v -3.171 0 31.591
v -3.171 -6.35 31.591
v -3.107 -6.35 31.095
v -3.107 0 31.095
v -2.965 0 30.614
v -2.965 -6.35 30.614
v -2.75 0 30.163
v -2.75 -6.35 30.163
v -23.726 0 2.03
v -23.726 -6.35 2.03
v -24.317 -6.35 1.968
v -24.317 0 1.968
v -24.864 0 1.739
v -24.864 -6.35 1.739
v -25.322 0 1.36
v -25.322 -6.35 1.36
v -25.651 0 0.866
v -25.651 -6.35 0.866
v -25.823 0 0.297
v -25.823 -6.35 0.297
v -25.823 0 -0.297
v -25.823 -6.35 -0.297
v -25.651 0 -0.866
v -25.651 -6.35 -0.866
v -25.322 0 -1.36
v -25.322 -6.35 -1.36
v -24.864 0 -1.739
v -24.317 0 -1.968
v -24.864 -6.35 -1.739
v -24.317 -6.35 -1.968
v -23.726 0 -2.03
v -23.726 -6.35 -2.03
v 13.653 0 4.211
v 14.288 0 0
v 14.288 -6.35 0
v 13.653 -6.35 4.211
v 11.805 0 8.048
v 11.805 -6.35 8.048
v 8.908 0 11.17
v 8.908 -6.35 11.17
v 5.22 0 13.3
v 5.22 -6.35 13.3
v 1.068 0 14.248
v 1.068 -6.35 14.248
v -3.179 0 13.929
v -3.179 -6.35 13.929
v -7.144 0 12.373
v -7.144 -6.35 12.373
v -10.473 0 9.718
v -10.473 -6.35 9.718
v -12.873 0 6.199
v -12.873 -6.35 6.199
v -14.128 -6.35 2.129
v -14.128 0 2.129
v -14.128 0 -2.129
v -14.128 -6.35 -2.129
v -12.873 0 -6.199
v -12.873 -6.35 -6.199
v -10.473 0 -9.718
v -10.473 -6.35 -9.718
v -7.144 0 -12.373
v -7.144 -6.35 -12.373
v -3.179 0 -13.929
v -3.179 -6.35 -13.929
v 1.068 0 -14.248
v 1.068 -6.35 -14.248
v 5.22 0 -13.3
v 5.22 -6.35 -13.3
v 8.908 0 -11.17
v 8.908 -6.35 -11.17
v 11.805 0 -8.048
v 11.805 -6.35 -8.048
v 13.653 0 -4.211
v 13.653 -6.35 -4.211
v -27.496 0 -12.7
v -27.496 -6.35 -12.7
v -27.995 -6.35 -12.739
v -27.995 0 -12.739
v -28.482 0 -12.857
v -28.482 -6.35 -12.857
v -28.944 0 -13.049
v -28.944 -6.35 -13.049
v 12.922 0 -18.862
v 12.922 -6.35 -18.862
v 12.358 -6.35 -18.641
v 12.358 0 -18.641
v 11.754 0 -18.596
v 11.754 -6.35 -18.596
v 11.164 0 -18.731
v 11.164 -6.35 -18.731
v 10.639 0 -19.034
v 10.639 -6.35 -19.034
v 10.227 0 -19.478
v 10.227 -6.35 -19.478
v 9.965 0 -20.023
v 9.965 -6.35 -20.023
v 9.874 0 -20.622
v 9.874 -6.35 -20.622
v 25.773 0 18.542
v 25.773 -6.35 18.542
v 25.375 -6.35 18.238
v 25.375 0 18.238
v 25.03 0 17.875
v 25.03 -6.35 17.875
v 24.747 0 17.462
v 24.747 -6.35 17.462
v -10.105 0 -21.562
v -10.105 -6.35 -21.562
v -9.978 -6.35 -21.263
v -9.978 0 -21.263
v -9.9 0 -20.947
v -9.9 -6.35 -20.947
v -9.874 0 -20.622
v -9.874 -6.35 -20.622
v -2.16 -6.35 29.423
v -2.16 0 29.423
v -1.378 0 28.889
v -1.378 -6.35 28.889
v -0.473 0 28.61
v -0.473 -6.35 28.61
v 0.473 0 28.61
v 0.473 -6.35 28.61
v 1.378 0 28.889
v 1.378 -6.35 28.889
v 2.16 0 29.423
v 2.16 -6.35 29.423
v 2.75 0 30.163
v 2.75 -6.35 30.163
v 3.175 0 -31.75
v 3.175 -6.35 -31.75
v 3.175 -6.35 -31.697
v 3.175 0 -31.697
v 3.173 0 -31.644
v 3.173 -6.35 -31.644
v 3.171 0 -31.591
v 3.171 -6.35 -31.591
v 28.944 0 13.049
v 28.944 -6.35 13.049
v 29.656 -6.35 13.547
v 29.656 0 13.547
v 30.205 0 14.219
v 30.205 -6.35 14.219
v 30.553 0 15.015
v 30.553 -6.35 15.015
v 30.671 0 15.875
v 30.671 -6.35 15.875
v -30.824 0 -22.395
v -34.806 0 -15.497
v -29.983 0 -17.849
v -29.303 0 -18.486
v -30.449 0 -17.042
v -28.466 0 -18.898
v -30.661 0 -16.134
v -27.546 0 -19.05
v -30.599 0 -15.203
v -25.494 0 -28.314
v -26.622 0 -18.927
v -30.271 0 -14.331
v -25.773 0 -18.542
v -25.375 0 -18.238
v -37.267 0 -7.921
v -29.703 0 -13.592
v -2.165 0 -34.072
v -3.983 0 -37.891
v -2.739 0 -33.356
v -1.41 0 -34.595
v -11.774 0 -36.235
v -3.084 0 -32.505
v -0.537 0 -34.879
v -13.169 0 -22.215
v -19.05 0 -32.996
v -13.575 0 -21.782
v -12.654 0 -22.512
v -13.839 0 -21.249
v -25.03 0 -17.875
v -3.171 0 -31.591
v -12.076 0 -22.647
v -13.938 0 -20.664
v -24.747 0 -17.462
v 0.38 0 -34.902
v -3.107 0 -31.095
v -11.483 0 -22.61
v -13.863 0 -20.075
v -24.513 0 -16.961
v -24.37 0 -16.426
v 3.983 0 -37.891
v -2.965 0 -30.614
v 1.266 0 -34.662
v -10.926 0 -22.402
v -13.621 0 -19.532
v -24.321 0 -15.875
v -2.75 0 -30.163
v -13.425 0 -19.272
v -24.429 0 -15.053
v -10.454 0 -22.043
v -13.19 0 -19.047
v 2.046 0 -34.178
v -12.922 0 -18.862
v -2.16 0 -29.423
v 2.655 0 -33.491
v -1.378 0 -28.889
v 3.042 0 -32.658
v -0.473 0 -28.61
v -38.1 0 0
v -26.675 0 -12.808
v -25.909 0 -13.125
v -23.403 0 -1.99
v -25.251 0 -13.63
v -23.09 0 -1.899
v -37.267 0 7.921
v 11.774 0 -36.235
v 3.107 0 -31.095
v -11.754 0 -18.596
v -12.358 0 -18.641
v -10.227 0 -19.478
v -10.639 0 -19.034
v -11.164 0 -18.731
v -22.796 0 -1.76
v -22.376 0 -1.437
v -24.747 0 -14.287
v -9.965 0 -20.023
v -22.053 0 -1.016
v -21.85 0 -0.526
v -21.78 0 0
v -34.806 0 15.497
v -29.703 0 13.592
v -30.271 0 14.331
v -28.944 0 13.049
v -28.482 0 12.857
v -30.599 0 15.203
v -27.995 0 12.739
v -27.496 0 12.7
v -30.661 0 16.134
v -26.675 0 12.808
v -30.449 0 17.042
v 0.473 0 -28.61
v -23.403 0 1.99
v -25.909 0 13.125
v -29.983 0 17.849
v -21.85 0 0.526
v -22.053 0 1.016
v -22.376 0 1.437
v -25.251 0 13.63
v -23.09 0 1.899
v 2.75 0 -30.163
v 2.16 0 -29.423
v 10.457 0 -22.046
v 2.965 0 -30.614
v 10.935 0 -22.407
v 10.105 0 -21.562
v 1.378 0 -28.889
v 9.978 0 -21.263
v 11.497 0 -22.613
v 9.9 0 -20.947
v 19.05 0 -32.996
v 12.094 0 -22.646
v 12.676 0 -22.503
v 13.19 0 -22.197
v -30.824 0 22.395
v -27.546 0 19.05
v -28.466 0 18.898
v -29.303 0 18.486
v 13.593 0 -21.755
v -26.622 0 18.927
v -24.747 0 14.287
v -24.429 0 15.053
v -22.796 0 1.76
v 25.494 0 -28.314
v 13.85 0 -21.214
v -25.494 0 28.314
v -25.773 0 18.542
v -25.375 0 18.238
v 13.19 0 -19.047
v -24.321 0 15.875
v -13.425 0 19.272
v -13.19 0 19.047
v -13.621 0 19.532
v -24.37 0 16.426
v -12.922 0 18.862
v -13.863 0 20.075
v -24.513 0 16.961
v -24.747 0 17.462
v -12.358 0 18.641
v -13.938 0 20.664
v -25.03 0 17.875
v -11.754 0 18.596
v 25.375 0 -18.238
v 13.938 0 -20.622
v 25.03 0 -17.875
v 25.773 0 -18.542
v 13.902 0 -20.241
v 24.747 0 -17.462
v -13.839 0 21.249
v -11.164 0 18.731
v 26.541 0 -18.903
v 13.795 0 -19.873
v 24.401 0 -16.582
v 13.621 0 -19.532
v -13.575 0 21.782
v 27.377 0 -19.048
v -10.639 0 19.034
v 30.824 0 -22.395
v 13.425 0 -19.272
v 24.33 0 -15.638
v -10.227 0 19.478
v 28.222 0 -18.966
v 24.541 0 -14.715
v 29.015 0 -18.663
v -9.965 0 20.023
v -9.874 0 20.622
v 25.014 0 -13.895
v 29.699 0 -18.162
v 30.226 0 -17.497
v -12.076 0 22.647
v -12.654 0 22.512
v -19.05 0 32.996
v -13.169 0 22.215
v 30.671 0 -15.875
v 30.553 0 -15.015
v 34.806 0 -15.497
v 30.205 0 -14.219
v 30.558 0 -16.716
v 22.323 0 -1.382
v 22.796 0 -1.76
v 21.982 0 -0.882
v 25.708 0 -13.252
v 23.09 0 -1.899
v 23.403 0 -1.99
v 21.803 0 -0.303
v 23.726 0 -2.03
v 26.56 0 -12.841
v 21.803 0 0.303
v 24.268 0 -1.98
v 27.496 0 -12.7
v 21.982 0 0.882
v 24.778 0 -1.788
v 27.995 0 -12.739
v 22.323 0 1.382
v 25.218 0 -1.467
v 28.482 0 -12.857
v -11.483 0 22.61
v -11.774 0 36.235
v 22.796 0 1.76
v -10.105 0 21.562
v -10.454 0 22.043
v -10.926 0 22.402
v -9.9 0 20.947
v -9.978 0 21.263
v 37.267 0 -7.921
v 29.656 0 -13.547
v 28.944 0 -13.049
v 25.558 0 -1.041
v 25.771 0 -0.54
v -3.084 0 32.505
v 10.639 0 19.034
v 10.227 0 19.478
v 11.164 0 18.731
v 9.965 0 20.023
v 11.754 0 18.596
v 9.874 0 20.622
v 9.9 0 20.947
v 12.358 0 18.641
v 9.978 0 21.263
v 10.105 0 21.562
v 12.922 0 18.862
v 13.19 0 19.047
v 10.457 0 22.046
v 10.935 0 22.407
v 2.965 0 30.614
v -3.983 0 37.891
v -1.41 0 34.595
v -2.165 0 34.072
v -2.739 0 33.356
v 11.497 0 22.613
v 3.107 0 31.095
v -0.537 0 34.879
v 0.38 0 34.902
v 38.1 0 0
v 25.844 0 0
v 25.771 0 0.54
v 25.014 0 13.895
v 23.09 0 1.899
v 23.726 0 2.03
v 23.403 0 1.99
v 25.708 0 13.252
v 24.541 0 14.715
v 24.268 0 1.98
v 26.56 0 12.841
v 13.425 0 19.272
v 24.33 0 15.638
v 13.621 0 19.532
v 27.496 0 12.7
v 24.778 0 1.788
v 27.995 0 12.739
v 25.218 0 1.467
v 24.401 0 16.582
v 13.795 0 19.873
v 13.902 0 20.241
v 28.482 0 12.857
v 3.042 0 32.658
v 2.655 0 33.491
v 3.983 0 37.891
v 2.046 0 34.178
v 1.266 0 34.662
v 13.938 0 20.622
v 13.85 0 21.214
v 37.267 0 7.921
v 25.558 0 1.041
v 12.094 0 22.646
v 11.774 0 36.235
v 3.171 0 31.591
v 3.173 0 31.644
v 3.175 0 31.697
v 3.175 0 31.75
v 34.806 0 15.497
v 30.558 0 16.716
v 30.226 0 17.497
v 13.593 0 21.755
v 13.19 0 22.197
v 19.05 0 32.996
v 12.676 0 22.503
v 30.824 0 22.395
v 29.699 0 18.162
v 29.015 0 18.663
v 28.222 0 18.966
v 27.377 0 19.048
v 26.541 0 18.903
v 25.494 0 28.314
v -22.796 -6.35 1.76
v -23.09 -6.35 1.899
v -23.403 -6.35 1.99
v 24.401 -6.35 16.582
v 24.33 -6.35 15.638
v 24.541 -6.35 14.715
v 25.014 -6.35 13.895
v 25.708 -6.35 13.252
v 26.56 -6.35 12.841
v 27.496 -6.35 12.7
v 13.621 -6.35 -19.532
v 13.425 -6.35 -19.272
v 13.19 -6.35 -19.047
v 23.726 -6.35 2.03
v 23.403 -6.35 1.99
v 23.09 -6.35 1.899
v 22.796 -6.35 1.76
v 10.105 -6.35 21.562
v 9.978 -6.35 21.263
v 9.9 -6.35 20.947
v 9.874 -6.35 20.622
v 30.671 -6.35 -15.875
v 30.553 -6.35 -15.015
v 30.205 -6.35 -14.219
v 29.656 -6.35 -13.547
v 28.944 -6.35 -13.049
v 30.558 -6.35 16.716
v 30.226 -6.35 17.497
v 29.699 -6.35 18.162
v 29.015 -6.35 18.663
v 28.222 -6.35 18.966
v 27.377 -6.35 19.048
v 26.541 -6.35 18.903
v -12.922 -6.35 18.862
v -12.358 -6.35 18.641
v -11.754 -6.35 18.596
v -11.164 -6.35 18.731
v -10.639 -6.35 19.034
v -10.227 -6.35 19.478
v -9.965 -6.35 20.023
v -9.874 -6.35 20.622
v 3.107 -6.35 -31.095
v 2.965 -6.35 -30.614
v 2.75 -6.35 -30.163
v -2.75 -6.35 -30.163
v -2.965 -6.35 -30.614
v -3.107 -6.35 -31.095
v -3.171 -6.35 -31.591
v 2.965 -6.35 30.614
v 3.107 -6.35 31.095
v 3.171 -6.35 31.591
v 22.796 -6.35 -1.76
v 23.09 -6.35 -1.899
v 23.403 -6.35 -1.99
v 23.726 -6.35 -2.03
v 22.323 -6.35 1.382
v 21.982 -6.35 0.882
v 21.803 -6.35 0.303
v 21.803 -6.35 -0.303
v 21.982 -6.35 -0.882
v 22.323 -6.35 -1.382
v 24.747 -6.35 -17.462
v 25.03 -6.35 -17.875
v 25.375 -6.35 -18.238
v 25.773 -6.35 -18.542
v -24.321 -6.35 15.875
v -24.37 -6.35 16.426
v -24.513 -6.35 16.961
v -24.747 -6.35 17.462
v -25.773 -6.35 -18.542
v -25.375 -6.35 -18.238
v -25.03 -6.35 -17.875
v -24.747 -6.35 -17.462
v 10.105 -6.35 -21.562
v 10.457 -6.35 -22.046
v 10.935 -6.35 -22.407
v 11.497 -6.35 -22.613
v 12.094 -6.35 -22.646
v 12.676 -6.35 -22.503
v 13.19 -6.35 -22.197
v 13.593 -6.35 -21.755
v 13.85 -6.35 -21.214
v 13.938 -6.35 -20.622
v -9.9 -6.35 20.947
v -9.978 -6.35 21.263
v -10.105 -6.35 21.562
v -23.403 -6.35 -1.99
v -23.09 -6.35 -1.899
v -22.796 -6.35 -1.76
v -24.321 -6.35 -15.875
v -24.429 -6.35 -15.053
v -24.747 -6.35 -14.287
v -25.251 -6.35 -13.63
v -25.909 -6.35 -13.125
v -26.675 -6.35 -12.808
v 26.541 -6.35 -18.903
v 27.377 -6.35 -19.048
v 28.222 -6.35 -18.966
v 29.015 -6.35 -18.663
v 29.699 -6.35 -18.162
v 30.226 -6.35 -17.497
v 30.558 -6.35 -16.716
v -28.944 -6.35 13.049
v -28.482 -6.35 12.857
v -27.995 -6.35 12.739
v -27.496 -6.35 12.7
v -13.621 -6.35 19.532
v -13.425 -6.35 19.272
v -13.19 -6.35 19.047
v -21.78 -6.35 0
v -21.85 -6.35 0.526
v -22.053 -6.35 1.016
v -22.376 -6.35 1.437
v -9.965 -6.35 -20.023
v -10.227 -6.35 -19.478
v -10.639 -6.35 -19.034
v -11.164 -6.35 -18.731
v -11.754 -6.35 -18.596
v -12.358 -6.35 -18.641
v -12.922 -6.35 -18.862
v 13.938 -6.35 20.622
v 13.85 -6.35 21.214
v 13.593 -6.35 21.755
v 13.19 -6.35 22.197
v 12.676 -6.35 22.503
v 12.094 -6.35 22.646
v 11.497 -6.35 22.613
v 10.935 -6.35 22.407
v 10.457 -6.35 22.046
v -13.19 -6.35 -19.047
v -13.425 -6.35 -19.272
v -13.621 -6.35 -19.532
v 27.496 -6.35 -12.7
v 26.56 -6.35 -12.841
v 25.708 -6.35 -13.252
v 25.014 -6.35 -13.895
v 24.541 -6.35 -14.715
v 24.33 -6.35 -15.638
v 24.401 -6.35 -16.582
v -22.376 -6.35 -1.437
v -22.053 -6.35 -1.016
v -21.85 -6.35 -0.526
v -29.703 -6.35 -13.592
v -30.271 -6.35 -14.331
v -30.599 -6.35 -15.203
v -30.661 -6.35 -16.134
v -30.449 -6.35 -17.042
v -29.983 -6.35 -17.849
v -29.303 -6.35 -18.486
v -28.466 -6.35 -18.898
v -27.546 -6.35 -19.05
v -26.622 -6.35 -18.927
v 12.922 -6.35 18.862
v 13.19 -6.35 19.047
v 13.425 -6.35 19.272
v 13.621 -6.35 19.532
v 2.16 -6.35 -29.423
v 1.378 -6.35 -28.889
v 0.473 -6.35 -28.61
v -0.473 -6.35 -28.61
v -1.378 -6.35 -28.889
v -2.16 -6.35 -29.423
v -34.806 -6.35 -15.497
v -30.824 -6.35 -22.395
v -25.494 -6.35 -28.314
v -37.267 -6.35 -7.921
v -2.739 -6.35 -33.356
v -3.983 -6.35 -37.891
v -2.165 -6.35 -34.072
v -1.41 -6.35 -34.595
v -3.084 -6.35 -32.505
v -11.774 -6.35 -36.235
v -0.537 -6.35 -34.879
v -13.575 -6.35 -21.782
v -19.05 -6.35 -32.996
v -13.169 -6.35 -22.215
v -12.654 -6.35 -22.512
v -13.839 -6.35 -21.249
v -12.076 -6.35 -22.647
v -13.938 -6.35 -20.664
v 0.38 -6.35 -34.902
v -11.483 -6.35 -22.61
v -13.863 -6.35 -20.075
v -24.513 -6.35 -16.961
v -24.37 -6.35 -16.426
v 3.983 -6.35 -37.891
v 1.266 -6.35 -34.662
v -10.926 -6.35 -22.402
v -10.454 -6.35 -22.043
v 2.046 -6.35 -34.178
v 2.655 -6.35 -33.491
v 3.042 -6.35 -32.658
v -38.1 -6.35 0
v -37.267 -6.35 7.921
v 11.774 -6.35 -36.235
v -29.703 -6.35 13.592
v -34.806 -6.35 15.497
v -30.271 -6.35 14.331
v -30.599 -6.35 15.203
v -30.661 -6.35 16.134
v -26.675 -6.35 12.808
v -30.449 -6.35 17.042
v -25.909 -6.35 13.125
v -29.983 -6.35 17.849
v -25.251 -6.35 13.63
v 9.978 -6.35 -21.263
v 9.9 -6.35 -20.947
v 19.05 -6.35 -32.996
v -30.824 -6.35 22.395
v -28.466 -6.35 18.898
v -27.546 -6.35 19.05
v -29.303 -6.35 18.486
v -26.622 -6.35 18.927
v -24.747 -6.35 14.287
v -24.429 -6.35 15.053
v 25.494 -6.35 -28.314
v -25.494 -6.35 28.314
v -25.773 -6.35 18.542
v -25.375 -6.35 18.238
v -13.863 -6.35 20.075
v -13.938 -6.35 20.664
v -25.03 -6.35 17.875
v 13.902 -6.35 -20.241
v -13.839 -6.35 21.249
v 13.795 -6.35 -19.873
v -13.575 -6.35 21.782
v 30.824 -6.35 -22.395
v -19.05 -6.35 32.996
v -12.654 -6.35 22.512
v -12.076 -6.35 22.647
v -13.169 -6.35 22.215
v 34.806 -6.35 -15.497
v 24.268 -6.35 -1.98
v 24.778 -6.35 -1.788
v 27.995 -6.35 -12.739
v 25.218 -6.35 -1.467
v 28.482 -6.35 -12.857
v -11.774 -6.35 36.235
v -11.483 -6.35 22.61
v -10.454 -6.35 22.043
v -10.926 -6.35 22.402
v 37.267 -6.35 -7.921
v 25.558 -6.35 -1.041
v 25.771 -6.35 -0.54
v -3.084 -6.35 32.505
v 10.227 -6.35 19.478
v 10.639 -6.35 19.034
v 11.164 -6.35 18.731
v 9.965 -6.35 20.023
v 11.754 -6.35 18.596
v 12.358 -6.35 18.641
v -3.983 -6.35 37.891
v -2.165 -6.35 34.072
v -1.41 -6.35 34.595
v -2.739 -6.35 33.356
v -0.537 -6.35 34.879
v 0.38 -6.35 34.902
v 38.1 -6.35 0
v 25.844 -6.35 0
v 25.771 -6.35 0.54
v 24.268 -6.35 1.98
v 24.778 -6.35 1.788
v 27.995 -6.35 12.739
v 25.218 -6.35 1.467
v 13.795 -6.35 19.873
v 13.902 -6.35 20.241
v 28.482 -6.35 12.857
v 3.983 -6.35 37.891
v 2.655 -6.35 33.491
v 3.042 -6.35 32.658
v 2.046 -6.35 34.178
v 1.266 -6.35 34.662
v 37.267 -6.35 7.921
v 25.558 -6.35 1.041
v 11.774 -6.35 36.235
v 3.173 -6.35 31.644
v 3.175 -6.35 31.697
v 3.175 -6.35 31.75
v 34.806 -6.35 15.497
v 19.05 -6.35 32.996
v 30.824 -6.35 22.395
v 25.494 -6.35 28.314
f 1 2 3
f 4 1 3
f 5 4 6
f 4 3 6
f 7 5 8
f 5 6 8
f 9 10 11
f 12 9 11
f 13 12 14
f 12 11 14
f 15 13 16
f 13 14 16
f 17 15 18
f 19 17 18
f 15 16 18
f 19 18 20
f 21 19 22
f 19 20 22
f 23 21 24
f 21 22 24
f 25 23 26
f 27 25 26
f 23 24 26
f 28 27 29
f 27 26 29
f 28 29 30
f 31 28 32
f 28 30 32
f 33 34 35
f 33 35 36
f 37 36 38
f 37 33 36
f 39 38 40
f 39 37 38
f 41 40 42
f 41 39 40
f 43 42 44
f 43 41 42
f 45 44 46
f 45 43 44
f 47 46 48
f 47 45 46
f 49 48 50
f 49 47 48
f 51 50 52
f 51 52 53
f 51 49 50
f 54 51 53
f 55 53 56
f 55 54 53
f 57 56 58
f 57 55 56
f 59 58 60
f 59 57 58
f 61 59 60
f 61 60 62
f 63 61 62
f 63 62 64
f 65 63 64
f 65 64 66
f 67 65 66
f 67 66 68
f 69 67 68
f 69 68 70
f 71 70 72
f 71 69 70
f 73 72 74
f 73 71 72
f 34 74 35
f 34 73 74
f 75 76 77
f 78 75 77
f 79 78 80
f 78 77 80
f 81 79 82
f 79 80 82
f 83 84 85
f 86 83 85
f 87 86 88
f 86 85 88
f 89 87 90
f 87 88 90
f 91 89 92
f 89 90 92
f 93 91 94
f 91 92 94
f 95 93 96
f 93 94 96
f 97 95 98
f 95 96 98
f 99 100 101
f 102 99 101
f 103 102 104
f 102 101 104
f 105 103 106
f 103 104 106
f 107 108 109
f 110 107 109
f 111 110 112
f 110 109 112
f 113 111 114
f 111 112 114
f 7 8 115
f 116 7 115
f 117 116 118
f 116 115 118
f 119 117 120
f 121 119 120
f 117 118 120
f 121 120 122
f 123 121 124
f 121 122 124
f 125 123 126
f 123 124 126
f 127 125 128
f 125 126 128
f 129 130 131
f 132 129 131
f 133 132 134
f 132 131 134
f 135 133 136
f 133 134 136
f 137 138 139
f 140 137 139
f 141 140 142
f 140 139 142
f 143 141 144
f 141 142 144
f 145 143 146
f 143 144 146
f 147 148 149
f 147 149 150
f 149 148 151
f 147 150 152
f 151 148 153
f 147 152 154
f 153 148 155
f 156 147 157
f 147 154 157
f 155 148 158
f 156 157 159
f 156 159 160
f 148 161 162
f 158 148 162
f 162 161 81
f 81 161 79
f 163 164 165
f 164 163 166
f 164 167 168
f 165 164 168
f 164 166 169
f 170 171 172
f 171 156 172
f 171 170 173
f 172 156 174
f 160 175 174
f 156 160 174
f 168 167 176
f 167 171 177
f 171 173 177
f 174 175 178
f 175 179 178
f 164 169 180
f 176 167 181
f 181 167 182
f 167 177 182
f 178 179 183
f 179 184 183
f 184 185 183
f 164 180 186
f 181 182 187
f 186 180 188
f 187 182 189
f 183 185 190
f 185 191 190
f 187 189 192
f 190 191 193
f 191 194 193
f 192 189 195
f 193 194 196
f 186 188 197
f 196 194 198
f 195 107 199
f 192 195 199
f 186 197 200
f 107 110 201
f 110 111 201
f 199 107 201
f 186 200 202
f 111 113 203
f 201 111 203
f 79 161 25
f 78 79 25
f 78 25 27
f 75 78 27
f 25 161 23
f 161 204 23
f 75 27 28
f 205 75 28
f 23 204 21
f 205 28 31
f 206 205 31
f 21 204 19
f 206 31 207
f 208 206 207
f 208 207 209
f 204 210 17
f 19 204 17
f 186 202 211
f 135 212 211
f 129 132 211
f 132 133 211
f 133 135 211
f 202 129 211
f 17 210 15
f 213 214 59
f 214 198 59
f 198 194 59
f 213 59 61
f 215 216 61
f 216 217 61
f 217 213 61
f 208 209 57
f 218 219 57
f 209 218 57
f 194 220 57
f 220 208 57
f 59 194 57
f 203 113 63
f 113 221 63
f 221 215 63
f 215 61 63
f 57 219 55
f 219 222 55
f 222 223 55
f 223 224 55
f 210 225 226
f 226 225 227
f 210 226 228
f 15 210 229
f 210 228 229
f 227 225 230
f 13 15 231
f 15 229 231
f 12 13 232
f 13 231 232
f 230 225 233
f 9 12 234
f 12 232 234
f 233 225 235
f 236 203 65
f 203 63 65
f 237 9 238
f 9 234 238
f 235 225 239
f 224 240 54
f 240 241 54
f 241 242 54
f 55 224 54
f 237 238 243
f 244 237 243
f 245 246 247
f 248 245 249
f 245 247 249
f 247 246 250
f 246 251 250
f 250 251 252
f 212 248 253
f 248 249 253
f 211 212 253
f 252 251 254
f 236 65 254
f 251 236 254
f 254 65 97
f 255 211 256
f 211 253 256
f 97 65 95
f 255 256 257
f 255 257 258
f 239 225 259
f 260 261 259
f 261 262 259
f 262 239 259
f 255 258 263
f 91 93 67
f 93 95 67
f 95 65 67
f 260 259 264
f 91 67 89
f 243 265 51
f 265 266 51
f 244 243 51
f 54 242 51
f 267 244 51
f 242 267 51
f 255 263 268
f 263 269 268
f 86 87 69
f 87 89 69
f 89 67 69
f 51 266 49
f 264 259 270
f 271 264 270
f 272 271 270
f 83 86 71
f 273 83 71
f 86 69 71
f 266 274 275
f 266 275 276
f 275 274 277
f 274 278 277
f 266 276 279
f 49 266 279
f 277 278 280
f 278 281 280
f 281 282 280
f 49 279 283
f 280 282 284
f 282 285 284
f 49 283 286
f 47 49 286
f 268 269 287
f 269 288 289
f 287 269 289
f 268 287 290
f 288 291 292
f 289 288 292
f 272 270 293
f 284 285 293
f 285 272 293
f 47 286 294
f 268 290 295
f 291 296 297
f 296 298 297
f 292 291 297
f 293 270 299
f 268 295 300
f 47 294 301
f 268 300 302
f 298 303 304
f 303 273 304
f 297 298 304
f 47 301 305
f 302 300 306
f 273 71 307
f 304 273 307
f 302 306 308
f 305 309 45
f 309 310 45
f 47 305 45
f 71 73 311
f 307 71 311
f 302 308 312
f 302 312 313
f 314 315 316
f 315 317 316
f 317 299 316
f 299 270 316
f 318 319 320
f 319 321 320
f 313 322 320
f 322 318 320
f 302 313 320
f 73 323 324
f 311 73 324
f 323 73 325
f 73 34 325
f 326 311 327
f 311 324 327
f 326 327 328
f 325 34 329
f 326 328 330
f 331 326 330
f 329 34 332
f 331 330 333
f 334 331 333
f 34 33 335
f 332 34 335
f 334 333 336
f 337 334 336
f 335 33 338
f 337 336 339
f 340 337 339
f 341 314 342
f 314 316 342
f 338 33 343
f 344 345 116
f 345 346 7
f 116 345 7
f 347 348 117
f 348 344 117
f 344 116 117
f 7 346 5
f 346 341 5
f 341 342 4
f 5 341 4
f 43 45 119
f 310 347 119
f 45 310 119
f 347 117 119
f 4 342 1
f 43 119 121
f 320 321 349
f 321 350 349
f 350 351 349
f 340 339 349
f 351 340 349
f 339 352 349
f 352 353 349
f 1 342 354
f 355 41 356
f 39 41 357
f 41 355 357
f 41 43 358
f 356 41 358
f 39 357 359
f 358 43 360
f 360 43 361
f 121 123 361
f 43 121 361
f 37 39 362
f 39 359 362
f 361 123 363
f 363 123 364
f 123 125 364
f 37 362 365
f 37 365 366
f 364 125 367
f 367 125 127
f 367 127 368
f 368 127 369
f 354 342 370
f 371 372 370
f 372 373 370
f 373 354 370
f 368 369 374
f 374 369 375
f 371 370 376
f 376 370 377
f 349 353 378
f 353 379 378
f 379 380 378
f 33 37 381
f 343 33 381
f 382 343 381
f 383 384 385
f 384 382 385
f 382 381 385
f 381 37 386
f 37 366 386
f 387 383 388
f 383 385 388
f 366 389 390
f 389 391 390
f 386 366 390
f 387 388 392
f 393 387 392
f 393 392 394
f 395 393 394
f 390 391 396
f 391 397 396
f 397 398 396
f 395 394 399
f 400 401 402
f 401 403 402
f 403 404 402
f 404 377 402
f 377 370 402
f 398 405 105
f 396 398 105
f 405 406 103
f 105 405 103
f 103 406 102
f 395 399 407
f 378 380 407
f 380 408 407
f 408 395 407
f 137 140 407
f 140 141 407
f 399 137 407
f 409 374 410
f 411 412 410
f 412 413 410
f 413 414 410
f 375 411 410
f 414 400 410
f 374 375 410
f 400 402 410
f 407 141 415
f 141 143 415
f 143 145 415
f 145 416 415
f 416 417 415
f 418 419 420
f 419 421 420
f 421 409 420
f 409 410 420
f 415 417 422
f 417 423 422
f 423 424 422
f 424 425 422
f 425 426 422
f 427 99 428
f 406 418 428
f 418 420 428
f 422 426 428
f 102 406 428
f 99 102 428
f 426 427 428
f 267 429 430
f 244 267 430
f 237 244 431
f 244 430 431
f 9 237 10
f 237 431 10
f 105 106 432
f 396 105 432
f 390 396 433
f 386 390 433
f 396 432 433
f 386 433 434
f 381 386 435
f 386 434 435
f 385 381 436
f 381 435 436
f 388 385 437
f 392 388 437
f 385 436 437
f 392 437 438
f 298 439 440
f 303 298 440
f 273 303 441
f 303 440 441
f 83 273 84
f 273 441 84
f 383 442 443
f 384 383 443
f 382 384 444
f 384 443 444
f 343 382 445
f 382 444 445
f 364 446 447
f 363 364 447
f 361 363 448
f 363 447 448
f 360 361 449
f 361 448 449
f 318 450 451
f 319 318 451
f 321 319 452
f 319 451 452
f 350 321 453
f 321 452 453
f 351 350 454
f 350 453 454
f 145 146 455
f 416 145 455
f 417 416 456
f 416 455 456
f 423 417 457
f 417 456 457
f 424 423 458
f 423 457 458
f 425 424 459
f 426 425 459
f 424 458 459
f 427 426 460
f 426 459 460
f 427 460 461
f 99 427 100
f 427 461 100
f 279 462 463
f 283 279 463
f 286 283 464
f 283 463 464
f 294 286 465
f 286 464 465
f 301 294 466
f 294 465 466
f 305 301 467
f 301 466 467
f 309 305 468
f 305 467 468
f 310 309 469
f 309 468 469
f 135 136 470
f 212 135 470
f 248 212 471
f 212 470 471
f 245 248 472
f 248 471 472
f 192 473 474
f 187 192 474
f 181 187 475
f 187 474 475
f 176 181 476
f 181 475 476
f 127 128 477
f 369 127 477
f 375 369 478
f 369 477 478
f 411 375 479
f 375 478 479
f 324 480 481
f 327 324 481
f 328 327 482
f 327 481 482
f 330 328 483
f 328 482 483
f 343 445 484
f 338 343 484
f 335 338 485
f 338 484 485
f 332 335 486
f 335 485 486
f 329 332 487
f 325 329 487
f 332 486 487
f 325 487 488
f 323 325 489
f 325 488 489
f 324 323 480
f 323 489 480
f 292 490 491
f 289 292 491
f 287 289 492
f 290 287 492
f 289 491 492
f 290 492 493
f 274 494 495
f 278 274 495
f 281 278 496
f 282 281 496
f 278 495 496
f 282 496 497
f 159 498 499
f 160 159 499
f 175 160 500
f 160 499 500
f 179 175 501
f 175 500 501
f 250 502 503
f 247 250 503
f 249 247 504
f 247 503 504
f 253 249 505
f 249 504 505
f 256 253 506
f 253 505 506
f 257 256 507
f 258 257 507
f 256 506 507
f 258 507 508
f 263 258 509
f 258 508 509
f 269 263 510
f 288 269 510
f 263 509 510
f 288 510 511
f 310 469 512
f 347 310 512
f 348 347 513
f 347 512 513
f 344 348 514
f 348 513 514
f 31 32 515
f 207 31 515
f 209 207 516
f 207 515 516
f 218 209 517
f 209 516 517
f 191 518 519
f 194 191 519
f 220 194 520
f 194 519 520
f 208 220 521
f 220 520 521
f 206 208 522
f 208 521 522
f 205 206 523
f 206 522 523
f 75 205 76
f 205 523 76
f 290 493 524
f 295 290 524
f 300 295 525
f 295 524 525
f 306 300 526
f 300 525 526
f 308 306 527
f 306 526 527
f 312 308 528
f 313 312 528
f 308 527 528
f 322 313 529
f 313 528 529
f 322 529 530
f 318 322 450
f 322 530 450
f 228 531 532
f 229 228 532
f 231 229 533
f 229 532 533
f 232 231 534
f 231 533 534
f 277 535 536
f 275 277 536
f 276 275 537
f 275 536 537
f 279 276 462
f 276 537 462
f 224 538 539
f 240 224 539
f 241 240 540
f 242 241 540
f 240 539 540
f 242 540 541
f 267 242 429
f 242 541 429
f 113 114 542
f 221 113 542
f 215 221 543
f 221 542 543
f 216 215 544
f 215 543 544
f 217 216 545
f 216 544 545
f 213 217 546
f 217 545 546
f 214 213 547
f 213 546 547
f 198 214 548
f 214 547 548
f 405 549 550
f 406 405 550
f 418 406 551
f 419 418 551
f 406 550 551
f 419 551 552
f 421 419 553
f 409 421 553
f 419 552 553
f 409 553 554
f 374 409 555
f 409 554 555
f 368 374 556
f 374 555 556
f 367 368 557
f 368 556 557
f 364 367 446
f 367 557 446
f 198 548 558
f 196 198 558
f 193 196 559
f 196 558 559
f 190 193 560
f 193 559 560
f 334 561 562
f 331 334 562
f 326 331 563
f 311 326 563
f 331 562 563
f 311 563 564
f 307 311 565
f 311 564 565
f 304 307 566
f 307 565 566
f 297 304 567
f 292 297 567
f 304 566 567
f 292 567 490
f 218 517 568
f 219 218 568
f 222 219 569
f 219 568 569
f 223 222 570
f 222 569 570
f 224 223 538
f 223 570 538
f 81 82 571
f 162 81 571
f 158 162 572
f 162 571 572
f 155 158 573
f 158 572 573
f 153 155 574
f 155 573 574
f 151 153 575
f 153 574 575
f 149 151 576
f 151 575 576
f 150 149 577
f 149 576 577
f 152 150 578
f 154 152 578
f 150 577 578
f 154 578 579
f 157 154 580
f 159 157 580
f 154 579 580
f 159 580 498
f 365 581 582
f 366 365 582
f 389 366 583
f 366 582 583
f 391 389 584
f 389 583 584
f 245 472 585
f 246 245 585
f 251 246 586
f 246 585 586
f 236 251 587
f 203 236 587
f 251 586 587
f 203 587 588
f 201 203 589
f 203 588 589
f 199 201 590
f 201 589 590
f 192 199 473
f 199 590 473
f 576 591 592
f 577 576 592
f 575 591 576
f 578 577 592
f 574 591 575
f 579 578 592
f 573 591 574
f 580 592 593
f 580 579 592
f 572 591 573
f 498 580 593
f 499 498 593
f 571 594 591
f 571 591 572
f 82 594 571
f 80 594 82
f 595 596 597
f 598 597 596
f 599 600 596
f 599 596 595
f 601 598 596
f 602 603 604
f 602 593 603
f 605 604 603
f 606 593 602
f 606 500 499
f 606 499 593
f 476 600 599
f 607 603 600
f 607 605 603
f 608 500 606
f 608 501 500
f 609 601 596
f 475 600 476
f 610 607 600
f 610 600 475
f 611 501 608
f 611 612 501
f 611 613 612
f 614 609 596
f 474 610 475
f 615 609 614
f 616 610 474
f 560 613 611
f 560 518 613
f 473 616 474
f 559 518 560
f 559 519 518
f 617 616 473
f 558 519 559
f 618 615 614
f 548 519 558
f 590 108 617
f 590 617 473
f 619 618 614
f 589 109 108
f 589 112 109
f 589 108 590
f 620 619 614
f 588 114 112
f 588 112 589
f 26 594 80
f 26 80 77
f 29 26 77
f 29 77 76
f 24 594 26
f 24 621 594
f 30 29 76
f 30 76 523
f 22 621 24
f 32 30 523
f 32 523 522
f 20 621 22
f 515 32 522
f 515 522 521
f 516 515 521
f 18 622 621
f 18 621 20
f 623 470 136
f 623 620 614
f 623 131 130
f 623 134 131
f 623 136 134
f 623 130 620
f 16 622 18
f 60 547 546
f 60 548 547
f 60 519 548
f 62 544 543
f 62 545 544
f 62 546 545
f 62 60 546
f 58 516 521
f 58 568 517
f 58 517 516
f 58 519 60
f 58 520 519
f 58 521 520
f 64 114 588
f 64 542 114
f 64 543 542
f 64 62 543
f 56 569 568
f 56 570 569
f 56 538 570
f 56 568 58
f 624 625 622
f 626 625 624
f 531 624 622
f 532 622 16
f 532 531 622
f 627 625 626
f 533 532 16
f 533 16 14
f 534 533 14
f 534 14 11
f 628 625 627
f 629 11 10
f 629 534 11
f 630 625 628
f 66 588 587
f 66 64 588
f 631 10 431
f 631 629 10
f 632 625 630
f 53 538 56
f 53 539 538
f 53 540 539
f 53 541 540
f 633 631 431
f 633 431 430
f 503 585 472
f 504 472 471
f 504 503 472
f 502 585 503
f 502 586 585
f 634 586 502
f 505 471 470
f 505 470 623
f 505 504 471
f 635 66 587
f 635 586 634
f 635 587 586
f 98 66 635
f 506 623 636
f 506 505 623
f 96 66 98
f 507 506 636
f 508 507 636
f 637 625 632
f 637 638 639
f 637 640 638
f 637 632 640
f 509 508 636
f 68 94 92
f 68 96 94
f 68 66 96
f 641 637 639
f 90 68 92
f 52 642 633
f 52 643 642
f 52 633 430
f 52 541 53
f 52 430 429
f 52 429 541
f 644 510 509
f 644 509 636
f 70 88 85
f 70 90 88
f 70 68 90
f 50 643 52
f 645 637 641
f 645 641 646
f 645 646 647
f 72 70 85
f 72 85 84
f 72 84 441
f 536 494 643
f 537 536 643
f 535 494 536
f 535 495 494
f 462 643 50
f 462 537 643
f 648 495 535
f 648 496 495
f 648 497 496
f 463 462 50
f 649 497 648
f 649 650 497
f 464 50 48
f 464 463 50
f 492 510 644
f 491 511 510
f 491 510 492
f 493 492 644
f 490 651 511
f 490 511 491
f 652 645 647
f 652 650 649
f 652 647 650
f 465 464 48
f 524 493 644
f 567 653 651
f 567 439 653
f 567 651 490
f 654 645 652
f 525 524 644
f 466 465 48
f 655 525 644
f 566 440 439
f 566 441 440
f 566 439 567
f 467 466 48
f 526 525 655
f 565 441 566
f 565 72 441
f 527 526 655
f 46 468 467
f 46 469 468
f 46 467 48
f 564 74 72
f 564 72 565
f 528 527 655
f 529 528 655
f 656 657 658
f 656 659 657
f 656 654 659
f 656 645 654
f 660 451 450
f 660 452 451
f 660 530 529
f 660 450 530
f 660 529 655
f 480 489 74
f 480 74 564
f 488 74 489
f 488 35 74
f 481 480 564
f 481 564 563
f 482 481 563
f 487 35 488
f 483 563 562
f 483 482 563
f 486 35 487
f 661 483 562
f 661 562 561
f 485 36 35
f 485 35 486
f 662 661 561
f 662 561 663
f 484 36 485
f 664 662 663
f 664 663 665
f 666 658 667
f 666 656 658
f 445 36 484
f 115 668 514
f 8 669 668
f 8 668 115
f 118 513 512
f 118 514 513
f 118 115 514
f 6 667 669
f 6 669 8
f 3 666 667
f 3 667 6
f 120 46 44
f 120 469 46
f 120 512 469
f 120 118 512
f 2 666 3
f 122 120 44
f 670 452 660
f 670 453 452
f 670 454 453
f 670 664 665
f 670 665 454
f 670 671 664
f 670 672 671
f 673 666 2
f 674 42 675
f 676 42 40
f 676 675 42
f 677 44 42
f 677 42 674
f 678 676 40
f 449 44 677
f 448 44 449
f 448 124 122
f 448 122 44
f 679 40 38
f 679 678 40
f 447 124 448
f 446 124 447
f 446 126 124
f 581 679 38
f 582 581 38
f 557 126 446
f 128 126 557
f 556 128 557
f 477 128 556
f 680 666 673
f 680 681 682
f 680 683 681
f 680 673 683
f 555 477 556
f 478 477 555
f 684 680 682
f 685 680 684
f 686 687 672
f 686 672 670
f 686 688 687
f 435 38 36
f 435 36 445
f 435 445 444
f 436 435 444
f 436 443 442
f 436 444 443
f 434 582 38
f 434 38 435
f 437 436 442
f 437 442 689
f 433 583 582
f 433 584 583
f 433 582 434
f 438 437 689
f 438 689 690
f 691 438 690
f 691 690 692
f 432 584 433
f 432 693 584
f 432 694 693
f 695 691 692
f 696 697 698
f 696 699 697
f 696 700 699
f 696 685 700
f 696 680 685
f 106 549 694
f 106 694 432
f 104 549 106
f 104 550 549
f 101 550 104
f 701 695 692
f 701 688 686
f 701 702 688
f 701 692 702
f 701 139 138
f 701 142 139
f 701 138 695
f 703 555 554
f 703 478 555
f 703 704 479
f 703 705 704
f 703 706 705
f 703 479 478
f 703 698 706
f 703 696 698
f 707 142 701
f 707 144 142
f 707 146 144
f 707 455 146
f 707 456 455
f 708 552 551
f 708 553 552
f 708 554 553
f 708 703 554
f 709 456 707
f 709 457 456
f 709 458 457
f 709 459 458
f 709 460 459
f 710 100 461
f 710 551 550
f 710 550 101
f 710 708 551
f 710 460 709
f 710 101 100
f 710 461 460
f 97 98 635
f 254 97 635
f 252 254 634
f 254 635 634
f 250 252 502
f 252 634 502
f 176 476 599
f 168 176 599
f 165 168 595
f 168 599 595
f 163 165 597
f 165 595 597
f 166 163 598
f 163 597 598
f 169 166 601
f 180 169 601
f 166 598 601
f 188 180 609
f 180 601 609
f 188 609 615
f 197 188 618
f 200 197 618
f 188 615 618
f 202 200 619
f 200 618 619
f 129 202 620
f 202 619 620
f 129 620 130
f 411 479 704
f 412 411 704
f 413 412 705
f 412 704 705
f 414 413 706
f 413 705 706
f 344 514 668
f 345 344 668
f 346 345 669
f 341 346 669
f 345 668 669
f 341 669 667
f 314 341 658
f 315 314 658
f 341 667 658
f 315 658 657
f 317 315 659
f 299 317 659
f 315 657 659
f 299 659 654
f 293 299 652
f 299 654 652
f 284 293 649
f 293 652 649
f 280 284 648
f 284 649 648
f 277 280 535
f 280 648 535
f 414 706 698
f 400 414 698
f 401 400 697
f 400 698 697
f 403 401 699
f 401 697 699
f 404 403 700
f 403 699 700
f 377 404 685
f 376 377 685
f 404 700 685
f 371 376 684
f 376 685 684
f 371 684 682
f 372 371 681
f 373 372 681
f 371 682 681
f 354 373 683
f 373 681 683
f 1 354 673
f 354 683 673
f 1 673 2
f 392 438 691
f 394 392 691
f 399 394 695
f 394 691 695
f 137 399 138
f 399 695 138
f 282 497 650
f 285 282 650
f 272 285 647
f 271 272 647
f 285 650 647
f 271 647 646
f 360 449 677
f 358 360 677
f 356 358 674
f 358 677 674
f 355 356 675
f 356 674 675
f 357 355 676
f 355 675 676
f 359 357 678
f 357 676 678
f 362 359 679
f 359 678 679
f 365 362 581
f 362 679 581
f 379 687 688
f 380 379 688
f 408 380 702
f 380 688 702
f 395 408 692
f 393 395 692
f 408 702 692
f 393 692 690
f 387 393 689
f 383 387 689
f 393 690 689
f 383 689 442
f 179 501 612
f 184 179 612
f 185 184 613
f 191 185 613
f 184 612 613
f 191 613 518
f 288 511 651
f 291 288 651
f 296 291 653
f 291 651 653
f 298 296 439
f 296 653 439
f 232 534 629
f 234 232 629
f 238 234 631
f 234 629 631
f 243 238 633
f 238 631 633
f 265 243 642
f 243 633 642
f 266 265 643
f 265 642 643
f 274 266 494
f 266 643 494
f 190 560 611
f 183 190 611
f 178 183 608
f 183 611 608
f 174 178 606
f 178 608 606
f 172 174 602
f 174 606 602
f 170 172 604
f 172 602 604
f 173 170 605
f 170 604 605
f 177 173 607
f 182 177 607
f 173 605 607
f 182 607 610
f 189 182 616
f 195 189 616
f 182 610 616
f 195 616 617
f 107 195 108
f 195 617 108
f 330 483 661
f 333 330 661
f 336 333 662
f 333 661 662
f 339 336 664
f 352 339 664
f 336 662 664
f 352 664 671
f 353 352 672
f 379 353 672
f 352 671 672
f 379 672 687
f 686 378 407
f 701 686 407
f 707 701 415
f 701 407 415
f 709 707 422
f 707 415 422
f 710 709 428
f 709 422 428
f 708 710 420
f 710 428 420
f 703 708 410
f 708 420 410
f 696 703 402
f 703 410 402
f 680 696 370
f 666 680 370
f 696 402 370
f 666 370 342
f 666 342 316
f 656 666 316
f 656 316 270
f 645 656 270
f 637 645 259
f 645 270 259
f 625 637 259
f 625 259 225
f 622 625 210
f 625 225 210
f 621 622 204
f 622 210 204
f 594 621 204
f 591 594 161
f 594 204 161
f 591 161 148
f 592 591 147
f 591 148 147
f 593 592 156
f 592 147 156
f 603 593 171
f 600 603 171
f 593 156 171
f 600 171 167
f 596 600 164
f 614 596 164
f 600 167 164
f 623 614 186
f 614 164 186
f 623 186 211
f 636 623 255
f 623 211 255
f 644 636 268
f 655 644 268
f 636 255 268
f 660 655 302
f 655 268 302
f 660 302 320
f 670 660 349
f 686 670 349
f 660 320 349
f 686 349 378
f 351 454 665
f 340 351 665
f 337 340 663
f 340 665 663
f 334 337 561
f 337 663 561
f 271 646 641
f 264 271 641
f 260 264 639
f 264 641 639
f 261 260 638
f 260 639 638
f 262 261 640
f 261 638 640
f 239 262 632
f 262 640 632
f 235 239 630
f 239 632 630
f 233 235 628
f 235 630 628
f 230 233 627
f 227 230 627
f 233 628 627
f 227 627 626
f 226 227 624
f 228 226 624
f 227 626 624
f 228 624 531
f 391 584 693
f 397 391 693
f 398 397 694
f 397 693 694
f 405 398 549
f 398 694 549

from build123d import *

# Parameters (mm, degrees)
F0_R     = 38.1
F0_R_2   = 14.2875
F1_DEPTH = 6.35
F3_DEPTH = 6.351


with BuildPart() as f1:
    # F0 (on Front) → F1 (new body)
    with BuildSketch(Plane.XZ):
        Circle(F0_R)
        Circle(F0_R_2, mode=Mode.SUBTRACT)
    extrude(amount=F1_DEPTH)

    # F2 (on face) → F3 (cut, through all)
    with BuildSketch(Plane.XZ.offset(6.35)):
        with BuildLine():
            ThreePointArc((27.4963065702, 15.875), (28.2556646786, 14.4803285036), (28.9443394205, 13.0494335321))
            ThreePointArc((28.9443394205, 13.0494335321), (30.2053773795, 14.2192342104), (30.6713065702, 15.875))
            ThreePointArc((30.6713065702, 15.875), (29.0145478169, 18.6634706412), (25.7733106541, 18.5418164679))
            ThreePointArc((25.7733106541, 18.5418164679), (26.6681646786, 17.2299591606), (27.4963065702, 15.875))
        make_face()
        with BuildLine():
            ThreePointArc((27.4963065702, 12.7), (28.2411056923, 12.7885944421), (28.9443394205, 13.0494335321))
            ThreePointArc((28.9443394205, 13.0494335321), (28.2556646786, 14.4803285036), (27.4963065702, 15.875))
            Line((27.4963065702, 15.875), (27.4963065702, 12.7))
        make_face()
        with BuildLine():
            Line((24.7466759131, 17.4625), (27.4963065702, 15.875))
            ThreePointArc((27.4963065702, 15.875), (26.6681646786, 17.2299591606), (25.7733106541, 18.5418164679))
            ThreePointArc((25.7733106541, 18.5418164679), (25.1958005117, 18.0632177394), (24.7466759131, 17.4625))
        make_face()
        with BuildLine():
            ThreePointArc((0, 31.75), (1.5875, 31.7102876643), (3.1710287664, 31.59125))
            ThreePointArc((3.1710287664, 31.59125), (3.1740070363, 31.6706001681), (3.175, 31.75))
            ThreePointArc((3.175, 31.75), (-0.0793998319, 34.9240070363), (-3.1710287664, 31.59125))
            ThreePointArc((-3.1710287664, 31.59125), (-1.5875, 31.7102876643), (0, 31.75))
        make_face()
        with BuildLine():
            ThreePointArc((2.749630657, 30.1625), (3.0453051806, 30.8518121815), (3.1710287664, 31.59125))
            ThreePointArc((3.1710287664, 31.59125), (1.5875, 31.7102876643), (0, 31.75))
            Line((0, 31.75), (2.749630657, 30.1625))
        make_face()
        with BuildLine():
            Line((-2.749630657, 30.1625), (0, 31.75))
            ThreePointArc((0, 31.75), (-1.5875, 31.7102876643), (-3.1710287664, 31.59125))
            ThreePointArc((-3.1710287664, 31.59125), (-3.0453051806, 30.8518121815), (-2.749630657, 30.1625))
        make_face()
        with BuildLine():
            ThreePointArc((-27.4963065702, 15.875), (-26.6681646786, 17.2299591606), (-25.7733106541, 18.5418164679))
            ThreePointArc((-25.7733106541, 18.5418164679), (-30.2459372272, 17.4625), (-28.9443394205, 13.0494335321))
            ThreePointArc((-28.9443394205, 13.0494335321), (-28.2556646786, 14.4803285036), (-27.4963065702, 15.875))
        make_face()
        with BuildLine():
            Line((-27.4963065702, 15.875), (-24.7466759131, 17.4625))
            ThreePointArc((-24.7466759131, 17.4625), (-25.1958005117, 18.0632177394), (-25.7733106541, 18.5418164679))
            ThreePointArc((-25.7733106541, 18.5418164679), (-26.6681646786, 17.2299591606), (-27.4963065702, 15.875))
        make_face()
        with BuildLine():
            Line((-27.4963065702, 12.7), (-27.4963065702, 15.875))
            ThreePointArc((-27.4963065702, 15.875), (-28.2556646786, 14.4803285036), (-28.9443394205, 13.0494335321))
            ThreePointArc((-28.9443394205, 13.0494335321), (-28.2411056923, 12.7885944421), (-27.4963065702, 12.7))
        make_face()
        with BuildLine():
            ThreePointArc((-28.9443394205, -13.0494335321), (-30.2459372272, -17.4625), (-25.7733106541, -18.5418164679))
            ThreePointArc((-25.7733106541, -18.5418164679), (-26.6681646786, -17.2299591606), (-27.4963065702, -15.875))
            ThreePointArc((-27.4963065702, -15.875), (-28.2556646786, -14.4803285036), (-28.9443394205, -13.0494335321))
        make_face()
        with BuildLine():
            ThreePointArc((-28.9443394205, -13.0494335321), (-28.2556646786, -14.4803285036), (-27.4963065702, -15.875))
            Line((-27.4963065702, -15.875), (-27.4963065702, -12.7))
            ThreePointArc((-27.4963065702, -12.7), (-28.2411056923, -12.7885944421), (-28.9443394205, -13.0494335321))
        make_face()
        with BuildLine():
            ThreePointArc((-25.7733106541, -18.5418164679), (-25.1958005117, -18.0632177394), (-24.7466759131, -17.4625))
            Line((-24.7466759131, -17.4625), (-27.4963065702, -15.875))
            ThreePointArc((-27.4963065702, -15.875), (-26.6681646786, -17.2299591606), (-25.7733106541, -18.5418164679))
        make_face()
        with BuildLine():
            ThreePointArc((3.175, -31.75), (3.1740070363, -31.6706001681), (3.1710287664, -31.59125))
            ThreePointArc((3.1710287664, -31.59125), (1.5875, -31.7102876643), (0, -31.75))
            ThreePointArc((0, -31.75), (-1.5875, -31.7102876643), (-3.1710287664, -31.59125))
            ThreePointArc((-3.1710287664, -31.59125), (-0.0793998319, -34.9240070363), (3.175, -31.75))
        make_face()
        with BuildLine():
            ThreePointArc((-3.1710287664, -31.59125), (-1.5875, -31.7102876643), (0, -31.75))
            Line((0, -31.75), (-2.749630657, -30.1625))
            ThreePointArc((-2.749630657, -30.1625), (-3.0453051806, -30.8518121815), (-3.1710287664, -31.59125))
        make_face()
        with BuildLine():
            ThreePointArc((0, -31.75), (1.5875, -31.7102876643), (3.1710287664, -31.59125))
            ThreePointArc((3.1710287664, -31.59125), (3.0453051806, -30.8518121815), (2.749630657, -30.1625))
            Line((2.749630657, -30.1625), (0, -31.75))
        make_face()
        with BuildLine():
            ThreePointArc((30.6713065702, -15.875), (30.2053773795, -14.2192342104), (28.9443394205, -13.0494335321))
            ThreePointArc((28.9443394205, -13.0494335321), (28.2556646786, -14.4803285036), (27.4963065702, -15.875))
            ThreePointArc((27.4963065702, -15.875), (26.6681646786, -17.2299591606), (25.7733106541, -18.5418164679))
            ThreePointArc((25.7733106541, -18.5418164679), (29.0145478169, -18.6634706412), (30.6713065702, -15.875))
        make_face()
        with BuildLine():
            ThreePointArc((25.7733106541, -18.5418164679), (26.6681646786, -17.2299591606), (27.4963065702, -15.875))
            Line((27.4963065702, -15.875), (24.7466759131, -17.4625))
            ThreePointArc((24.7466759131, -17.4625), (25.1958005117, -18.0632177394), (25.7733106541, -18.5418164679))
        make_face()
        with BuildLine():
            ThreePointArc((27.4963065702, -15.875), (28.2556646786, -14.4803285036), (28.9443394205, -13.0494335321))
            ThreePointArc((28.9443394205, -13.0494335321), (28.2411056923, -12.7885944421), (27.4963065702, -12.7))
            Line((27.4963065702, -12.7), (27.4963065702, -15.875))
        make_face()
        with BuildLine():
            ThreePointArc((-24.3213065702, 15.875), (-24.4294920717, 16.6967504682), (-24.7466759131, 17.4625))
            Line((-24.7466759131, 17.4625), (-27.4963065702, 15.875))
            Line((-27.4963065702, 15.875), (-27.4963065702, 12.7))
            ThreePointArc((-27.4963065702, 12.7), (-25.2512425399, 13.6299359697), (-24.3213065702, 15.875))
        make_face()
        with BuildLine():
            Line((-27.4963065702, -15.875), (-24.7466759131, -17.4625))
            ThreePointArc((-24.7466759131, -17.4625), (-24.4294920717, -16.6967504682), (-24.3213065702, -15.875))
            ThreePointArc((-24.3213065702, -15.875), (-25.2512425399, -13.6299359697), (-27.4963065702, -12.7))
            Line((-27.4963065702, -12.7), (-27.4963065702, -15.875))
        make_face()
        with BuildLine():
            Line((0, -31.75), (2.749630657, -30.1625))
            ThreePointArc((2.749630657, -30.1625), (0, -28.575), (-2.749630657, -30.1625))
            Line((-2.749630657, -30.1625), (0, -31.75))
        make_face()
        with BuildLine():
            Line((24.7466759131, -17.4625), (27.4963065702, -15.875))
            Line((27.4963065702, -15.875), (27.4963065702, -12.7))
            ThreePointArc((27.4963065702, -12.7), (24.7466759131, -14.2875), (24.7466759131, -17.4625))
        make_face()
        with BuildLine():
            Line((27.4963065702, 12.7), (27.4963065702, 15.875))
            Line((27.4963065702, 15.875), (24.7466759131, 17.4625))
            ThreePointArc((24.7466759131, 17.4625), (24.7466759131, 14.2875), (27.4963065702, 12.7))
        make_face()
        with BuildLine():
            ThreePointArc((-2.749630657, 30.1625), (0, 28.575), (2.749630657, 30.1625))
            Line((2.749630657, 30.1625), (0, 31.75))
            Line((0, 31.75), (-2.749630657, 30.1625))
        make_face()
        with BuildLine():
            ThreePointArc((-11.90625, 20.6222299276), (-11.0155259197, 21.1114505651), (-10.1047395518, 21.5622214728))
            ThreePointArc((-10.1047395518, 21.5622214728), (-12.92225, 22.3819935481), (-13.6210617816, 19.5320718869))
            ThreePointArc((-13.6210617816, 19.5320718869), (-12.7752895402, 20.0954505651), (-11.90625, 20.6222299276))
        make_face()
        with BuildLine():
            ThreePointArc((-12.92225, 18.8624663071), (-10.89025, 18.8624663071), (-9.87425, 20.6222299276))
            Line((-9.87425, 20.6222299276), (-11.90625, 20.6222299276))
            Line((-11.90625, 20.6222299276), (-12.92225, 18.8624663071))
        make_face()
        with BuildLine():
            Line((-11.90625, 20.6222299276), (-9.87425, 20.6222299276))
            ThreePointArc((-9.87425, 20.6222299276), (-9.9327134244, 21.1061487066), (-10.1047395518, 21.5622214728))
            ThreePointArc((-10.1047395518, 21.5622214728), (-11.0155259197, 21.1114505651), (-11.90625, 20.6222299276))
        make_face()
        with BuildLine():
            Line((-12.92225, 18.8624663071), (-11.90625, 20.6222299276))
            ThreePointArc((-11.90625, 20.6222299276), (-12.7752895402, 20.0954505651), (-13.6210617816, 19.5320718869))
            ThreePointArc((-13.6210617816, 19.5320718869), (-13.3121042437, 19.1550565073), (-12.92225, 18.8624663071))
        make_face()
        with BuildLine():
            Line((9.87425, 20.6222299276), (11.90625, 20.6222299276))
            ThreePointArc((11.90625, 20.6222299276), (11.0155259197, 21.1114505651), (10.1047395518, 21.5622214728))
            ThreePointArc((10.1047395518, 21.5622214728), (9.9327134244, 21.1061487066), (9.87425, 20.6222299276))
        make_face()
        with BuildLine():
            ThreePointArc((11.90625, 20.6222299276), (12.7752895402, 20.0954505651), (13.6210617816, 19.5320718869))
            ThreePointArc((13.6210617816, 19.5320718869), (13.8573421993, 20.0545475957), (13.93825, 20.6222299276))
            ThreePointArc((13.93825, 20.6222299276), (12.3901687789, 22.5957665033), (10.1047395518, 21.5622214728))
            ThreePointArc((10.1047395518, 21.5622214728), (11.0155259197, 21.1114505651), (11.90625, 20.6222299276))
        make_face()
        with BuildLine():
            ThreePointArc((9.87425, 20.6222299276), (10.89025, 18.8624663071), (12.92225, 18.8624663071))
            Line((12.92225, 18.8624663071), (11.90625, 20.6222299276))
            Line((11.90625, 20.6222299276), (9.87425, 20.6222299276))
        make_face()
        with BuildLine():
            ThreePointArc((12.92225, 18.8624663071), (13.3121042437, 19.1550565073), (13.6210617816, 19.5320718869))
            ThreePointArc((13.6210617816, 19.5320718869), (12.7752895402, 20.0954505651), (11.90625, 20.6222299276))
            Line((11.90625, 20.6222299276), (12.92225, 18.8624663071))
        make_face()
        with BuildLine():
            Line((11.90625, -20.6222299276), (12.92225, -18.8624663071))
            ThreePointArc((12.92225, -18.8624663071), (10.89025, -18.8624663071), (9.87425, -20.6222299276))
            Line((9.87425, -20.6222299276), (11.90625, -20.6222299276))
        make_face()
        with BuildLine():
            ThreePointArc((13.93825, -20.6222299276), (13.8573421993, -20.0545475957), (13.6210617816, -19.5320718869))
            ThreePointArc((13.6210617816, -19.5320718869), (12.7752895402, -20.0954505651), (11.90625, -20.6222299276))
            ThreePointArc((11.90625, -20.6222299276), (11.0155259197, -21.1114505651), (10.1047395518, -21.5622214728))
            ThreePointArc((10.1047395518, -21.5622214728), (12.3901687789, -22.5957665033), (13.93825, -20.6222299276))
        make_face()
        with BuildLine():
            ThreePointArc((11.90625, -20.6222299276), (12.7752895402, -20.0954505651), (13.6210617816, -19.5320718869))
            ThreePointArc((13.6210617816, -19.5320718869), (13.3121042437, -19.1550565073), (12.92225, -18.8624663071))
            Line((12.92225, -18.8624663071), (11.90625, -20.6222299276))
        make_face()
        with BuildLine():
            ThreePointArc((10.1047395518, -21.5622214728), (11.0155259197, -21.1114505651), (11.90625, -20.6222299276))
            Line((11.90625, -20.6222299276), (9.87425, -20.6222299276))
            ThreePointArc((9.87425, -20.6222299276), (9.9327134244, -21.1061487066), (10.1047395518, -21.5622214728))
        make_face()
        with BuildLine():
            ThreePointArc((-13.6210617816, -19.5320718869), (-12.92225, -22.3819935481), (-10.1047395518, -21.5622214728))
            ThreePointArc((-10.1047395518, -21.5622214728), (-11.0155259197, -21.1114505651), (-11.90625, -20.6222299276))
            ThreePointArc((-11.90625, -20.6222299276), (-12.7752895402, -20.0954505651), (-13.6210617816, -19.5320718869))
        make_face()
        with BuildLine():
            ThreePointArc((-10.1047395518, -21.5622214728), (-9.9327134244, -21.1061487066), (-9.87425, -20.6222299276))
            Line((-9.87425, -20.6222299276), (-11.90625, -20.6222299276))
            ThreePointArc((-11.90625, -20.6222299276), (-11.0155259197, -21.1114505651), (-10.1047395518, -21.5622214728))
        make_face()
        with BuildLine():
            Line((-11.90625, -20.6222299276), (-9.87425, -20.6222299276))
            ThreePointArc((-9.87425, -20.6222299276), (-10.89025, -18.8624663071), (-12.92225, -18.8624663071))
            Line((-12.92225, -18.8624663071), (-11.90625, -20.6222299276))
        make_face()
        with BuildLine():
            ThreePointArc((-13.6210617816, -19.5320718869), (-12.7752895402, -20.0954505651), (-11.90625, -20.6222299276))
            Line((-11.90625, -20.6222299276), (-12.92225, -18.8624663071))
            ThreePointArc((-12.92225, -18.8624663071), (-13.3121042437, -19.1550565073), (-13.6210617816, -19.5320718869))
        make_face()
        with BuildLine():
            Line((-23.8125, 0), (-22.7965, 1.7597636205))
            ThreePointArc((-22.7965, 1.7597636205), (-23.2448176681, 1.9510921993), (-23.7258013333, 2.0301495859))
            ThreePointArc((-23.7258013333, 2.0301495859), (-23.79081546, 1.016), (-23.8125, 0))
        make_face()
        with BuildLine():
            ThreePointArc((-21.7805, 0), (-22.0527363795, 1.016), (-22.7965, 1.7597636205))
            Line((-22.7965, 1.7597636205), (-23.8125, 0))
            Line((-23.8125, 0), (-22.7965, -1.7597636205))
            ThreePointArc((-22.7965, -1.7597636205), (-22.0527363795, -1.016), (-21.7805, 0))
        make_face()
        with BuildLine():
            ThreePointArc((-23.7258013333, -2.0301495859), (-23.2448176681, -1.9510921993), (-22.7965, -1.7597636205))
            Line((-22.7965, -1.7597636205), (-23.8125, 0))
            ThreePointArc((-23.8125, 0), (-23.79081546, -1.016), (-23.7258013333, -2.0301495859))
        make_face()
        with BuildLine():
            ThreePointArc((-23.8125, 0), (-23.79081546, 1.016), (-23.7258013333, 2.0301495859))
            ThreePointArc((-23.7258013333, 2.0301495859), (-25.8445, 0), (-23.7258013333, -2.0301495859))
            ThreePointArc((-23.7258013333, -2.0301495859), (-23.79081546, -1.016), (-23.8125, 0))
        make_face()
        with BuildLine():
            ThreePointArc((23.7258013333, 2.0301495859), (23.79081546, 1.016), (23.8125, 0))
            ThreePointArc((23.8125, 0), (23.79081546, -1.016), (23.7258013333, -2.0301495859))
            ThreePointArc((23.7258013333, -2.0301495859), (25.2183542437, -1.4671734203), (25.8445, 0))
            ThreePointArc((25.8445, 0), (25.2183542437, 1.4671734203), (23.7258013333, 2.0301495859))
        make_face()
        with BuildLine():
            Line((22.7965, 1.7597636205), (23.8125, 0))
            ThreePointArc((23.8125, 0), (23.79081546, 1.016), (23.7258013333, 2.0301495859))
            ThreePointArc((23.7258013333, 2.0301495859), (23.2448176681, 1.9510921993), (22.7965, 1.7597636205))
        make_face()
        with BuildLine():
            Line((22.7965, -1.7597636205), (23.8125, 0))
            Line((23.8125, 0), (22.7965, 1.7597636205))
            ThreePointArc((22.7965, 1.7597636205), (21.7805, 0), (22.7965, -1.7597636205))
        make_face()
        with BuildLine():
            ThreePointArc((23.7258013333, -2.0301495859), (23.79081546, -1.016), (23.8125, 0))
            Line((23.8125, 0), (22.7965, -1.7597636205))
            ThreePointArc((22.7965, -1.7597636205), (23.2448176681, -1.9510921993), (23.7258013333, -2.0301495859))
        make_face()
    extrude(amount=-F3_DEPTH, mode=Mode.SUBTRACT)


solid = f1.part
